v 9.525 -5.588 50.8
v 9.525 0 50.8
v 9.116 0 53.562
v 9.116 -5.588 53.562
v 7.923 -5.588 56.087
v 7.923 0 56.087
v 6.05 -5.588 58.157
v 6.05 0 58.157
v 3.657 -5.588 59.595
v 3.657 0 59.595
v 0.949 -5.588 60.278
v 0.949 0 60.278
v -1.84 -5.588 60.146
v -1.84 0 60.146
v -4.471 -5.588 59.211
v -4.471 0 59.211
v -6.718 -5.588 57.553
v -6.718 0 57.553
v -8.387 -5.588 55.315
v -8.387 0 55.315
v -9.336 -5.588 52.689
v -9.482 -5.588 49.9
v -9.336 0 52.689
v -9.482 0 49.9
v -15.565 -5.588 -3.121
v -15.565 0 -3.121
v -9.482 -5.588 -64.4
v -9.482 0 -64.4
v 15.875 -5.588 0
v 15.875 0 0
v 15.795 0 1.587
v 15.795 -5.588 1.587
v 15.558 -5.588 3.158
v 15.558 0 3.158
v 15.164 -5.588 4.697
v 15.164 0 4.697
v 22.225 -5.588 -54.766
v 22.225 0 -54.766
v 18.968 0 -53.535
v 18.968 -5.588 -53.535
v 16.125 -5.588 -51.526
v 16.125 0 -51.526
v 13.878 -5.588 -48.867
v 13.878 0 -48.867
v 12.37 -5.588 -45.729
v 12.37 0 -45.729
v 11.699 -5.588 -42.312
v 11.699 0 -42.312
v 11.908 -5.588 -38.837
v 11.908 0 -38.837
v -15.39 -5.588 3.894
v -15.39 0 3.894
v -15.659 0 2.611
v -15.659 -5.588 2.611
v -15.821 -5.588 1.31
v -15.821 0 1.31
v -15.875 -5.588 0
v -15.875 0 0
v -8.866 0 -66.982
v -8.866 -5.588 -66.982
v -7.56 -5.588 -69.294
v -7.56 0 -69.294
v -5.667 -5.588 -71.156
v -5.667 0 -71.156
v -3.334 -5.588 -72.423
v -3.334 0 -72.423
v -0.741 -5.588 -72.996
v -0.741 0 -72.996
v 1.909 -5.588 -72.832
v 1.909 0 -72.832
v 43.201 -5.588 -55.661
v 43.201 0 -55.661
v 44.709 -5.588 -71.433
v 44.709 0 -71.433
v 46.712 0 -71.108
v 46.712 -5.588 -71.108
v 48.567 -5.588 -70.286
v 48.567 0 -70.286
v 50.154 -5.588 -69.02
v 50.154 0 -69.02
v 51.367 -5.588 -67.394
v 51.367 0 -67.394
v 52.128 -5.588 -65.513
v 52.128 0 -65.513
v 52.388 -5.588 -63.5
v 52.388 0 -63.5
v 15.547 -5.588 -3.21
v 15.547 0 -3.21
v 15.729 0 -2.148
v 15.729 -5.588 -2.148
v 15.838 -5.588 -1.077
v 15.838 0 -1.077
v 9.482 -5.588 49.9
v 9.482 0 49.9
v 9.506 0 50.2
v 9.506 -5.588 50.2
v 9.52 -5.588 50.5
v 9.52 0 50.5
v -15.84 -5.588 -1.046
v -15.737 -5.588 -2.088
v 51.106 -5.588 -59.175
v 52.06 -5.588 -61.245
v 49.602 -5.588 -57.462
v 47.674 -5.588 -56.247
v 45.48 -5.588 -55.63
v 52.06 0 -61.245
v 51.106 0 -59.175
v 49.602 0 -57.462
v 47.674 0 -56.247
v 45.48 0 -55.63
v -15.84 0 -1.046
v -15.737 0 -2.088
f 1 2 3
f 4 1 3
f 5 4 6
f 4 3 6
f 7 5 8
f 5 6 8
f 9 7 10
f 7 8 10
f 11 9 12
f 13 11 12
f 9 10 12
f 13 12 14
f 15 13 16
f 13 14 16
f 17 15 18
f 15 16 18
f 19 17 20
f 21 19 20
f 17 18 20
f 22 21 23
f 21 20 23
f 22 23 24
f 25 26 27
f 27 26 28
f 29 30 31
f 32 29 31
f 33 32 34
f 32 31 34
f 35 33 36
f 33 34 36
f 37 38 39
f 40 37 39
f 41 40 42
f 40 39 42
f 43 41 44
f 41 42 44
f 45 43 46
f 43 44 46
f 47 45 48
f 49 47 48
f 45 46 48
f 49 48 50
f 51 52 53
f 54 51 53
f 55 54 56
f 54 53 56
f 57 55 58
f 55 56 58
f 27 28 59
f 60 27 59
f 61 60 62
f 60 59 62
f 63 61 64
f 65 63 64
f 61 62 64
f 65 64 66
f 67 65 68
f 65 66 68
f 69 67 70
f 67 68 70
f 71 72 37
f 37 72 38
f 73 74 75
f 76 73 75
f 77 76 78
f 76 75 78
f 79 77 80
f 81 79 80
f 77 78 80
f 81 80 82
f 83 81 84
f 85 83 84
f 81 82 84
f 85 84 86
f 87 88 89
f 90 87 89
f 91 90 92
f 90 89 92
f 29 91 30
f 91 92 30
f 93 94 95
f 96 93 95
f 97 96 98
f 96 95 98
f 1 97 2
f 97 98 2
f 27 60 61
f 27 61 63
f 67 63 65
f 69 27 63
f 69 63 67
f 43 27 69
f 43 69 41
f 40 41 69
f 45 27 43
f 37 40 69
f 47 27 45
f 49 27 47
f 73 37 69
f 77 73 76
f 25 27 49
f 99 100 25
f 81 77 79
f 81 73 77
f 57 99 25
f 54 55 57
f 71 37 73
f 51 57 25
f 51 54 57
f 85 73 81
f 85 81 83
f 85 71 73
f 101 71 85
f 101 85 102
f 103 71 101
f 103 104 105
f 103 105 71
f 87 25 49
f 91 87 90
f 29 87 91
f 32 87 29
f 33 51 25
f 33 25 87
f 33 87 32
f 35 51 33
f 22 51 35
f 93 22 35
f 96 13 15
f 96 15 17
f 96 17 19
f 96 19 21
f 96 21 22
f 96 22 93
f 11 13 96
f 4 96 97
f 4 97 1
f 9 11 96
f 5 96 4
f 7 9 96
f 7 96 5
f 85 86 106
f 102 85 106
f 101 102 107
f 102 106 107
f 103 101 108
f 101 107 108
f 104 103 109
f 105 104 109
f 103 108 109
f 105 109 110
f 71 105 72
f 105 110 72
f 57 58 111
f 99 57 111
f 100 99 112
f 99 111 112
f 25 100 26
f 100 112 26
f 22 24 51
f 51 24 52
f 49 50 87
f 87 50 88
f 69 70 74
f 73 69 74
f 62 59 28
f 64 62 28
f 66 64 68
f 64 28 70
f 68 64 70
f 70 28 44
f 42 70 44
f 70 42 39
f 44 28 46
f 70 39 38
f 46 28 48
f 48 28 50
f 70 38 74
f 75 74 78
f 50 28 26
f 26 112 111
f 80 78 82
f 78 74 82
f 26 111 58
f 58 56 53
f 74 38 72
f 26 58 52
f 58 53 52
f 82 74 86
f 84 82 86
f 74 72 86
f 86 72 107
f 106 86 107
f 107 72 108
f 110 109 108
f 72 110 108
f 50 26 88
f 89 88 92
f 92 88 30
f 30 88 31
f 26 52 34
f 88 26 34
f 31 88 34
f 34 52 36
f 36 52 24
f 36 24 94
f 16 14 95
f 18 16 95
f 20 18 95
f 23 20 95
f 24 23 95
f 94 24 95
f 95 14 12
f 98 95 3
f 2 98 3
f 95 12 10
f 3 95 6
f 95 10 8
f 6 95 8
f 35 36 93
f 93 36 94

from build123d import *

# Parameters (mm, degrees)
F0_R     = 3.175
F0_R_2   = 1.5875
F1_DEPTH = 5.588


with BuildPart() as f1:
    # F0 (on Front) → F1 (new body)
    with BuildSketch(Plane.XZ):
        with BuildLine():
            ThreePointArc((15.547094004, -3.2099054549), (-0.0454207738, -15.874935022), (-15.5652074351, -3.1208880949))
            Line((-15.5652074351, -3.1208880949), (-9.4824203242, -64.3996275867))
            ThreePointArc((-9.4824203242, -64.3996275867), (-0.4503173391, -53.9856508739), (9.525, -63.5))
            ThreePointArc((9.525, -63.5), (7.3792459071, -69.5226534719), (1.9087575134, -72.8317881328))
            Line((1.9087575134, -72.8317881328), (44.7092226012, -71.4332660294))
            ThreePointArc((44.7092226012, -71.4332660294), (36.5485288978, -64.2554208568), (43.2013451148, -55.6613287333))
            Line((43.2013451148, -55.6613287333), (22.225, -54.7662357154))
            ThreePointArc((22.225, -54.7662357154), (13.8776701671, -48.8669484195), (11.907621819, -38.8370722765))
            Line((11.907621819, -38.8370722765), (15.547094004, -3.2099054549))
        make_face()
        with BuildLine():
            ThreePointArc((15.1641631674, 4.6972098561), (-0.4169440477, 15.8695237062), (-15.3898941796, 3.8944553072))
            ThreePointArc((-15.3898941796, 3.8944553072), (-15.7532567284, 1.9622760889), (-15.875, 0))
            Line((-15.875, 0), (-15.5652074351, -3.1208880949))
            ThreePointArc((-15.5652074351, -3.1208880949), (-0.0454207738, -15.874935022), (15.547094004, -3.2099054549))
            Line((15.547094004, -3.2099054549), (15.875, 0))
            ThreePointArc((15.875, 0), (15.6962848356, 2.3753457345), (15.1641631674, 4.6972098561))
        make_face()
        with Locations((-9.429e-07, -0.0182211279)):
            Circle(F0_R, mode=Mode.SUBTRACT)
        with BuildLine():
            ThreePointArc((9.4824203242, 49.9003724133), (0, 41.275), (-9.4824203242, 49.9003724133))
            Line((-9.4824203242, 49.9003724133), (-15.3898941796, 3.8944553072))
            ThreePointArc((-15.3898941796, 3.8944553072), (-0.4169440477, 15.8695237062), (15.1641631674, 4.6972098561))
            Line((15.1641631674, 4.6972098561), (9.4824203242, 49.9003724133))
        make_face()
        with Locations((-4.310302902, 36.5252)):
            Circle(F0_R_2, mode=Mode.SUBTRACT)
        with BuildLine():
            ThreePointArc((9.525, -63.5), (-0.4503173391, -53.9856508739), (-9.4824203242, -64.3996275867))
            ThreePointArc((-9.4824203242, -64.3996275867), (-5.6670472877, -71.1557298828), (1.9087575134, -72.8317881328))
            ThreePointArc((1.9087575134, -72.8317881328), (7.3792459071, -69.5226534719), (9.525, -63.5))
        make_face()
        with Locations((-0.270415243, -63.8360157609)):
            Circle(F0_R, mode=Mode.SUBTRACT)
        with BuildLine():
            ThreePointArc((9.4824203242, 49.9003724133), (9.5143491261, 50.3496826609), (9.525, 50.8))
            ThreePointArc((9.525, 50.8), (-0.4503173391, 60.3143491261), (-9.4824203242, 49.9003724133))
            ThreePointArc((-9.4824203242, 49.9003724133), (0, 41.275), (9.4824203242, 49.9003724133))
        make_face()
        with Locations((0, 50.8)):
            Circle(F0_R, mode=Mode.SUBTRACT)
        with BuildLine():
            ThreePointArc((43.2013451148, -55.6613287333), (36.5485288978, -64.2554208568), (44.7092226012, -71.4332660294))
            ThreePointArc((44.7092226012, -71.4332660294), (50.1535728122, -69.0202503047), (52.3875, -63.5))
            ThreePointArc((52.3875, -63.5), (49.6023154066, -57.46199104), (43.2013451148, -55.6613287333))
        make_face()
        with Locations((44.3479567766, -64.1064271331)):
            Circle(F0_R, mode=Mode.SUBTRACT)
        with Locations((-0.270415243, -63.8360157609)):
            Circle(F0_R)
        with Locations((0, 50.8)):
            Circle(F0_R)
        with Locations((-9.429e-07, -0.0182211279)):
            Circle(F0_R)
        with Locations((44.3479567766, -64.1064271331)):
            Circle(F0_R)
        with Locations((-4.310302902, 36.5252)):
            Circle(F0_R_2)
        with BuildLine():
            ThreePointArc((15.547094004, -3.2099054549), (15.7928107428, -1.6133052541), (15.875, 0))
            Line((15.875, 0), (15.547094004, -3.2099054549))
        make_face()
        with BuildLine():
            Line((-15.5652074351, -3.1208880949), (-15.875, 0))
            ThreePointArc((-15.875, 0), (-15.7973620113, -1.5681130328), (-15.5652074351, -3.1208880949))
        make_face()
    extrude(amount=F1_DEPTH)


solid = f1.part
